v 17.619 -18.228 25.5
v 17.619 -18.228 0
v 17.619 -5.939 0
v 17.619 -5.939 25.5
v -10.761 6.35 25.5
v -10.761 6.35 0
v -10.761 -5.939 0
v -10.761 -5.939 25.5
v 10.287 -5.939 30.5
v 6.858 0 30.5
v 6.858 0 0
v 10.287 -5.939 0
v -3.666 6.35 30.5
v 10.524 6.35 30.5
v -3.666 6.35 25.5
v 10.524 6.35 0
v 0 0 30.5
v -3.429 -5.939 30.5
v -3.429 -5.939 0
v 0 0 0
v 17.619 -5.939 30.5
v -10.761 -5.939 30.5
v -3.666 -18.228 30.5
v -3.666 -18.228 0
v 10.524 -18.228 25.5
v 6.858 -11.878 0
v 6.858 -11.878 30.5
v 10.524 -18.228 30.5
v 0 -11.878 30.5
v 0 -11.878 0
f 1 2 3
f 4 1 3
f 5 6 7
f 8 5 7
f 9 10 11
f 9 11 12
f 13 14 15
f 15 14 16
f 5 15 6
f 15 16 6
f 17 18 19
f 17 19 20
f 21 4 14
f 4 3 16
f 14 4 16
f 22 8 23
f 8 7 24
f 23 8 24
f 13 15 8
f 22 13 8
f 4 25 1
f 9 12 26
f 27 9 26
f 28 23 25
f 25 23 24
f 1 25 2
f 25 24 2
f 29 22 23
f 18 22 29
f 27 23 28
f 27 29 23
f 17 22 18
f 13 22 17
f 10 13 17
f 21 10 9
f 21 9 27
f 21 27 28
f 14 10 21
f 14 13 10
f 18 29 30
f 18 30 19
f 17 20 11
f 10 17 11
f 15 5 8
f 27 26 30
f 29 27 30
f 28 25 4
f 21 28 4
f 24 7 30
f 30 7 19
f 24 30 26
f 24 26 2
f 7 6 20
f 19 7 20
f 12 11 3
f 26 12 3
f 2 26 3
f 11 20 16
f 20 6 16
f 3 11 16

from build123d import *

# Parameters (mm, degrees)
F1_DEPTH = 30.5
F2_DEPTH = 25.5


with BuildPart() as f1:
    # F0 (on Top) → F1 (new body)
    with BuildSketch(Plane.XY):
        Polygon((10.524174, 6.35), (-3.666174, 6.35), (-10.761348, -5.939202), (-3.666174, -18.228404), (10.524174, -18.228404), (17.619348, -5.939202), align=None)
        Polygon((-3.429, -5.939202), (0, 0), (6.858, 0), (10.287, -5.939202), (6.858, -11.878404), (0, -11.878404), align=None, mode=Mode.SUBTRACT)
    extrude(amount=F1_DEPTH)

    # F0 (on Top) → F2 (join)
    with BuildSketch(Plane.XY):
        Polygon((17.619348, -18.228404), (17.619348, -5.939202), (10.524174, -18.228404), align=None)
        Polygon((-10.761348, -5.939202), (-3.666174, 6.35), (-10.761348, 6.35), align=None)
    extrude(amount=F2_DEPTH)


solid = f1.part
